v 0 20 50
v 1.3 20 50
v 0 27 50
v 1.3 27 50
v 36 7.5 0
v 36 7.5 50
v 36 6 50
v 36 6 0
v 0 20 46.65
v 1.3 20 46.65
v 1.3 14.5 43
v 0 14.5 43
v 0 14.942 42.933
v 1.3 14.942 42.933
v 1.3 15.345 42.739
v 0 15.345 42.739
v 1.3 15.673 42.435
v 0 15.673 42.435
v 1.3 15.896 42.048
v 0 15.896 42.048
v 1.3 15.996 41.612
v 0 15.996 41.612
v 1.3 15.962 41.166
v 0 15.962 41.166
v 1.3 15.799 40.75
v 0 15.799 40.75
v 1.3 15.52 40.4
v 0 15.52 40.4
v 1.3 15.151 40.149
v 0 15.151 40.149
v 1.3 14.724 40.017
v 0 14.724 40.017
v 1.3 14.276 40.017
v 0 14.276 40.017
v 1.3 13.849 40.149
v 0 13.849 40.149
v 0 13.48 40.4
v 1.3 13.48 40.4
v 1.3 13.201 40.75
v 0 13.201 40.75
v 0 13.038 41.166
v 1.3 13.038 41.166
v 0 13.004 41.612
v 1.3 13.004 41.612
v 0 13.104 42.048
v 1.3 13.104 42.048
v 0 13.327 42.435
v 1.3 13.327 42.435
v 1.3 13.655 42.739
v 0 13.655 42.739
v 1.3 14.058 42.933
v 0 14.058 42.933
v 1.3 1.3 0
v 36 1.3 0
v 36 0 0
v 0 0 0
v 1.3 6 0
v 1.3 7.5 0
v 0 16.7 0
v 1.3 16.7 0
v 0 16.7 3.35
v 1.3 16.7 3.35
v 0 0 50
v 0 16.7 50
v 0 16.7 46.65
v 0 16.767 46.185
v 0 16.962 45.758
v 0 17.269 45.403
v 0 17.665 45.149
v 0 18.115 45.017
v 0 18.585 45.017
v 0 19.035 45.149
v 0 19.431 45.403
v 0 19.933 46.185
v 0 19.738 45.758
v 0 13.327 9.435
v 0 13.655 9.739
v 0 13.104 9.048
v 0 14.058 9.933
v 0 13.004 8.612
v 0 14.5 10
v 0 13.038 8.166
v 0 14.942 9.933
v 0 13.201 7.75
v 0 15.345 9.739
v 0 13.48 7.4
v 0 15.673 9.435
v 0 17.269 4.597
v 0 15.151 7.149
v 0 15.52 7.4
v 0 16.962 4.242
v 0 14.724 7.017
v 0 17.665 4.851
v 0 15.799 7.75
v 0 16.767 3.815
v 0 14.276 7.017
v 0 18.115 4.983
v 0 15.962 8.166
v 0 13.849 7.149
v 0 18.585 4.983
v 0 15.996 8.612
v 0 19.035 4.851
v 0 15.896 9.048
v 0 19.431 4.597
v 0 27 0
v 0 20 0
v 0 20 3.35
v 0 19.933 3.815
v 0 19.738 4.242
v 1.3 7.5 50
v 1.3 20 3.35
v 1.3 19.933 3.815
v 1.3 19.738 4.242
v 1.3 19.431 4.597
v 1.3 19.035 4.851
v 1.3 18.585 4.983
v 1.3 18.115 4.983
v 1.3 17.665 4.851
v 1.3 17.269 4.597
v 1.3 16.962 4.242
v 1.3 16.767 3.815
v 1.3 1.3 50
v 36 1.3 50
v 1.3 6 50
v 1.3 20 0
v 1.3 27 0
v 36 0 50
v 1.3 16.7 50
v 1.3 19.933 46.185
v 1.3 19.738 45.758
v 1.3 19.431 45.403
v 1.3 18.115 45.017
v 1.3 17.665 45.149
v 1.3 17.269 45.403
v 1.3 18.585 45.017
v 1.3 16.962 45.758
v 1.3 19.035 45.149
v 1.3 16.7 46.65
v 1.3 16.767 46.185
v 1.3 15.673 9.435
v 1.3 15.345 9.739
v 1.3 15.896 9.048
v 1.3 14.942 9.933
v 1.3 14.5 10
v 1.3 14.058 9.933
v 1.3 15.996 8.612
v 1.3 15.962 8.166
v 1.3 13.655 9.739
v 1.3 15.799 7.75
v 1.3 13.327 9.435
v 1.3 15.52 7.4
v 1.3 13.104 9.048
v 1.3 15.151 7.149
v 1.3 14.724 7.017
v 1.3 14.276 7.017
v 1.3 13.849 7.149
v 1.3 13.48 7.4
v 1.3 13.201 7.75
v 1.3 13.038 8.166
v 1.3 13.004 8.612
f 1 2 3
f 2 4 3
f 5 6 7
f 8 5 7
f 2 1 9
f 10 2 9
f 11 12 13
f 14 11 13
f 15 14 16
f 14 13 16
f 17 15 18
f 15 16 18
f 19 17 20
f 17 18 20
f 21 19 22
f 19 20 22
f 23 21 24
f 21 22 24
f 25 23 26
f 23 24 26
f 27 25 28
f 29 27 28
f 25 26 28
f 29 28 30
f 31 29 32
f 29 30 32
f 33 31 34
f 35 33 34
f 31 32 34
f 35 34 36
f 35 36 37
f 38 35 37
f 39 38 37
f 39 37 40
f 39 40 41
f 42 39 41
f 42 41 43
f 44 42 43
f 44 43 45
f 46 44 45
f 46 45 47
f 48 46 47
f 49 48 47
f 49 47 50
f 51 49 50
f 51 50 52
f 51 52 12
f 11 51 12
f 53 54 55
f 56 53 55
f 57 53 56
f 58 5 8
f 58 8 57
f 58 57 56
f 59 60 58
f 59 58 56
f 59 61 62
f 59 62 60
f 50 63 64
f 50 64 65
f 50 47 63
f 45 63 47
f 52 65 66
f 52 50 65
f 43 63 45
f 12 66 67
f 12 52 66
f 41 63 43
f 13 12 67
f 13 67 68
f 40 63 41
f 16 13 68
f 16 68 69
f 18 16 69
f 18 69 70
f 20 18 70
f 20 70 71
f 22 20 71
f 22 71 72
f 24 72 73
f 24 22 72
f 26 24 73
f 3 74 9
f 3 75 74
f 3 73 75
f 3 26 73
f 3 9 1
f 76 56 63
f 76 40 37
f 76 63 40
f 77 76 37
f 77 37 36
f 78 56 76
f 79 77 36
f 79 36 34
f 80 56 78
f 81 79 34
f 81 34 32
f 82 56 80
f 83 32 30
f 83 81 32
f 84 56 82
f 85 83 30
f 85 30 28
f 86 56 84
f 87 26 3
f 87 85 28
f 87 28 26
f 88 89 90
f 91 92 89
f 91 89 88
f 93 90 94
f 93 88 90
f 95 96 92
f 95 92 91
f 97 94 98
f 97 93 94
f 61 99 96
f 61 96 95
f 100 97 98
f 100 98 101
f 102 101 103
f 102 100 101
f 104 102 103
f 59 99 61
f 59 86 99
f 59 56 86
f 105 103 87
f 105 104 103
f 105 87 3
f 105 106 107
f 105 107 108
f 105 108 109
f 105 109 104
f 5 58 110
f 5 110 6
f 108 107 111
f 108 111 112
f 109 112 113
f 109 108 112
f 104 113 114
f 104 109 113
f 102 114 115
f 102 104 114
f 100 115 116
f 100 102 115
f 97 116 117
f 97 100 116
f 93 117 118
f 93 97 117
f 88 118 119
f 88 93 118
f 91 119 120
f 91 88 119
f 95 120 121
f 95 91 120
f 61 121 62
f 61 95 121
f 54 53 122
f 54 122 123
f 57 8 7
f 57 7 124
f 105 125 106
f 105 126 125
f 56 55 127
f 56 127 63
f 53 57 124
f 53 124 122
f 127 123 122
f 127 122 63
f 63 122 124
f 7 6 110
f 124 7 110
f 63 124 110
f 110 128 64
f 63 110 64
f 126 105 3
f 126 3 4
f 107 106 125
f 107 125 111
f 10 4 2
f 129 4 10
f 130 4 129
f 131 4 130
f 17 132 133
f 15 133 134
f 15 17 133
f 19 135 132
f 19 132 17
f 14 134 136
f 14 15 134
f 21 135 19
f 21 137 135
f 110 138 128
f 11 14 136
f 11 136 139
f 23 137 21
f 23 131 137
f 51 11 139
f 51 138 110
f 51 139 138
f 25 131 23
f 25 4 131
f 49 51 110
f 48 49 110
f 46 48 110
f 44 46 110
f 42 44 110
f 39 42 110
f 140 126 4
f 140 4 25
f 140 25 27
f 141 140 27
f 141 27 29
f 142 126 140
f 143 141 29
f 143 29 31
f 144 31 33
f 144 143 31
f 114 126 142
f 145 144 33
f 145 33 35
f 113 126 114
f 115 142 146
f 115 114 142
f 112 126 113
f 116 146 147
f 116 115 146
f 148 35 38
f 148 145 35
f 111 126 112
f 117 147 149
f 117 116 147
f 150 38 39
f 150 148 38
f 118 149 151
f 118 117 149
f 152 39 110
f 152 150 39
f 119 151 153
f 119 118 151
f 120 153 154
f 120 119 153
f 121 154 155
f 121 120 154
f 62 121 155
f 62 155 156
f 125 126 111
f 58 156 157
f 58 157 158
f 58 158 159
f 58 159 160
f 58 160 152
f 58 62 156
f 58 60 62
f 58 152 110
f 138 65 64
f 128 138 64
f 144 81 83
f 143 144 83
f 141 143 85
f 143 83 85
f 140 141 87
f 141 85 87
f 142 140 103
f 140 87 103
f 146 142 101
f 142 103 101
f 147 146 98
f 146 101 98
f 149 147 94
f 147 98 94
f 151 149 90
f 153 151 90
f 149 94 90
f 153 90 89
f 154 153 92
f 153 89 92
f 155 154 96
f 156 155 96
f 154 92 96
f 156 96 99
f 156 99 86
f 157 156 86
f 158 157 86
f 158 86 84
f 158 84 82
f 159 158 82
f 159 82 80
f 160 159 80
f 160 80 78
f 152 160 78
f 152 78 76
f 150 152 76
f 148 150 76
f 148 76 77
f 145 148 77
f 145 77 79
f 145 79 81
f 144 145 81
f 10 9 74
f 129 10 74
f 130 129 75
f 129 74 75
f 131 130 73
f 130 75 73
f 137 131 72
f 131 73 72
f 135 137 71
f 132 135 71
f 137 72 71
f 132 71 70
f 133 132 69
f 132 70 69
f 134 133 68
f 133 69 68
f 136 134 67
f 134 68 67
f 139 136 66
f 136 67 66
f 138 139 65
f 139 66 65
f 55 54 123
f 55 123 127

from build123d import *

# Parameters (mm, degrees)
RESSALTO_EXTRUS_O1_DEPTH = 50
ESBO_O2_R                = 1.5
CORTE_EXTRUS_O1_DEPTH    = 50


with BuildPart() as part:
    # Esboço1 → Ressalto-extrusão1 (new body)
    with BuildSketch(Plane.XY):
        Polygon((0, 0), (0, 27), (1.3, 27), (1.3, 7.5), (36, 7.5), (36, 6), (1.3, 6), (1.3, 1.3), (36, 1.3), (36, 0), align=None)
    extrude(amount=RESSALTO_EXTRUS_O1_DEPTH)

    # Esboço2 → Corte-extrusão1 (cut)
    with BuildSketch(Plane.ZY):
        with Locations((8.5, 14.5)):
            Circle(ESBO_O2_R)
        with Locations((41.5, 14.5)):
            Circle(ESBO_O2_R)
        with BuildLine():
            Line((0, 20), (3.35, 20))
            ThreePointArc((3.35, 20), (5, 18.35), (3.35, 16.7))
            Line((3.35, 16.7), (0, 16.7))
            Line((0, 16.7), (0, 20))
        make_face()
        with BuildLine():
            Line((50, 16.7), (50, 20))
            Line((50, 20), (46.65, 20))
            ThreePointArc((46.65, 20), (45, 18.35), (46.65, 16.7))
            Line((46.65, 16.7), (50, 16.7))
        make_face()
    extrude(amount=-CORTE_EXTRUS_O1_DEPTH, mode=Mode.SUBTRACT)


solid = part.part
